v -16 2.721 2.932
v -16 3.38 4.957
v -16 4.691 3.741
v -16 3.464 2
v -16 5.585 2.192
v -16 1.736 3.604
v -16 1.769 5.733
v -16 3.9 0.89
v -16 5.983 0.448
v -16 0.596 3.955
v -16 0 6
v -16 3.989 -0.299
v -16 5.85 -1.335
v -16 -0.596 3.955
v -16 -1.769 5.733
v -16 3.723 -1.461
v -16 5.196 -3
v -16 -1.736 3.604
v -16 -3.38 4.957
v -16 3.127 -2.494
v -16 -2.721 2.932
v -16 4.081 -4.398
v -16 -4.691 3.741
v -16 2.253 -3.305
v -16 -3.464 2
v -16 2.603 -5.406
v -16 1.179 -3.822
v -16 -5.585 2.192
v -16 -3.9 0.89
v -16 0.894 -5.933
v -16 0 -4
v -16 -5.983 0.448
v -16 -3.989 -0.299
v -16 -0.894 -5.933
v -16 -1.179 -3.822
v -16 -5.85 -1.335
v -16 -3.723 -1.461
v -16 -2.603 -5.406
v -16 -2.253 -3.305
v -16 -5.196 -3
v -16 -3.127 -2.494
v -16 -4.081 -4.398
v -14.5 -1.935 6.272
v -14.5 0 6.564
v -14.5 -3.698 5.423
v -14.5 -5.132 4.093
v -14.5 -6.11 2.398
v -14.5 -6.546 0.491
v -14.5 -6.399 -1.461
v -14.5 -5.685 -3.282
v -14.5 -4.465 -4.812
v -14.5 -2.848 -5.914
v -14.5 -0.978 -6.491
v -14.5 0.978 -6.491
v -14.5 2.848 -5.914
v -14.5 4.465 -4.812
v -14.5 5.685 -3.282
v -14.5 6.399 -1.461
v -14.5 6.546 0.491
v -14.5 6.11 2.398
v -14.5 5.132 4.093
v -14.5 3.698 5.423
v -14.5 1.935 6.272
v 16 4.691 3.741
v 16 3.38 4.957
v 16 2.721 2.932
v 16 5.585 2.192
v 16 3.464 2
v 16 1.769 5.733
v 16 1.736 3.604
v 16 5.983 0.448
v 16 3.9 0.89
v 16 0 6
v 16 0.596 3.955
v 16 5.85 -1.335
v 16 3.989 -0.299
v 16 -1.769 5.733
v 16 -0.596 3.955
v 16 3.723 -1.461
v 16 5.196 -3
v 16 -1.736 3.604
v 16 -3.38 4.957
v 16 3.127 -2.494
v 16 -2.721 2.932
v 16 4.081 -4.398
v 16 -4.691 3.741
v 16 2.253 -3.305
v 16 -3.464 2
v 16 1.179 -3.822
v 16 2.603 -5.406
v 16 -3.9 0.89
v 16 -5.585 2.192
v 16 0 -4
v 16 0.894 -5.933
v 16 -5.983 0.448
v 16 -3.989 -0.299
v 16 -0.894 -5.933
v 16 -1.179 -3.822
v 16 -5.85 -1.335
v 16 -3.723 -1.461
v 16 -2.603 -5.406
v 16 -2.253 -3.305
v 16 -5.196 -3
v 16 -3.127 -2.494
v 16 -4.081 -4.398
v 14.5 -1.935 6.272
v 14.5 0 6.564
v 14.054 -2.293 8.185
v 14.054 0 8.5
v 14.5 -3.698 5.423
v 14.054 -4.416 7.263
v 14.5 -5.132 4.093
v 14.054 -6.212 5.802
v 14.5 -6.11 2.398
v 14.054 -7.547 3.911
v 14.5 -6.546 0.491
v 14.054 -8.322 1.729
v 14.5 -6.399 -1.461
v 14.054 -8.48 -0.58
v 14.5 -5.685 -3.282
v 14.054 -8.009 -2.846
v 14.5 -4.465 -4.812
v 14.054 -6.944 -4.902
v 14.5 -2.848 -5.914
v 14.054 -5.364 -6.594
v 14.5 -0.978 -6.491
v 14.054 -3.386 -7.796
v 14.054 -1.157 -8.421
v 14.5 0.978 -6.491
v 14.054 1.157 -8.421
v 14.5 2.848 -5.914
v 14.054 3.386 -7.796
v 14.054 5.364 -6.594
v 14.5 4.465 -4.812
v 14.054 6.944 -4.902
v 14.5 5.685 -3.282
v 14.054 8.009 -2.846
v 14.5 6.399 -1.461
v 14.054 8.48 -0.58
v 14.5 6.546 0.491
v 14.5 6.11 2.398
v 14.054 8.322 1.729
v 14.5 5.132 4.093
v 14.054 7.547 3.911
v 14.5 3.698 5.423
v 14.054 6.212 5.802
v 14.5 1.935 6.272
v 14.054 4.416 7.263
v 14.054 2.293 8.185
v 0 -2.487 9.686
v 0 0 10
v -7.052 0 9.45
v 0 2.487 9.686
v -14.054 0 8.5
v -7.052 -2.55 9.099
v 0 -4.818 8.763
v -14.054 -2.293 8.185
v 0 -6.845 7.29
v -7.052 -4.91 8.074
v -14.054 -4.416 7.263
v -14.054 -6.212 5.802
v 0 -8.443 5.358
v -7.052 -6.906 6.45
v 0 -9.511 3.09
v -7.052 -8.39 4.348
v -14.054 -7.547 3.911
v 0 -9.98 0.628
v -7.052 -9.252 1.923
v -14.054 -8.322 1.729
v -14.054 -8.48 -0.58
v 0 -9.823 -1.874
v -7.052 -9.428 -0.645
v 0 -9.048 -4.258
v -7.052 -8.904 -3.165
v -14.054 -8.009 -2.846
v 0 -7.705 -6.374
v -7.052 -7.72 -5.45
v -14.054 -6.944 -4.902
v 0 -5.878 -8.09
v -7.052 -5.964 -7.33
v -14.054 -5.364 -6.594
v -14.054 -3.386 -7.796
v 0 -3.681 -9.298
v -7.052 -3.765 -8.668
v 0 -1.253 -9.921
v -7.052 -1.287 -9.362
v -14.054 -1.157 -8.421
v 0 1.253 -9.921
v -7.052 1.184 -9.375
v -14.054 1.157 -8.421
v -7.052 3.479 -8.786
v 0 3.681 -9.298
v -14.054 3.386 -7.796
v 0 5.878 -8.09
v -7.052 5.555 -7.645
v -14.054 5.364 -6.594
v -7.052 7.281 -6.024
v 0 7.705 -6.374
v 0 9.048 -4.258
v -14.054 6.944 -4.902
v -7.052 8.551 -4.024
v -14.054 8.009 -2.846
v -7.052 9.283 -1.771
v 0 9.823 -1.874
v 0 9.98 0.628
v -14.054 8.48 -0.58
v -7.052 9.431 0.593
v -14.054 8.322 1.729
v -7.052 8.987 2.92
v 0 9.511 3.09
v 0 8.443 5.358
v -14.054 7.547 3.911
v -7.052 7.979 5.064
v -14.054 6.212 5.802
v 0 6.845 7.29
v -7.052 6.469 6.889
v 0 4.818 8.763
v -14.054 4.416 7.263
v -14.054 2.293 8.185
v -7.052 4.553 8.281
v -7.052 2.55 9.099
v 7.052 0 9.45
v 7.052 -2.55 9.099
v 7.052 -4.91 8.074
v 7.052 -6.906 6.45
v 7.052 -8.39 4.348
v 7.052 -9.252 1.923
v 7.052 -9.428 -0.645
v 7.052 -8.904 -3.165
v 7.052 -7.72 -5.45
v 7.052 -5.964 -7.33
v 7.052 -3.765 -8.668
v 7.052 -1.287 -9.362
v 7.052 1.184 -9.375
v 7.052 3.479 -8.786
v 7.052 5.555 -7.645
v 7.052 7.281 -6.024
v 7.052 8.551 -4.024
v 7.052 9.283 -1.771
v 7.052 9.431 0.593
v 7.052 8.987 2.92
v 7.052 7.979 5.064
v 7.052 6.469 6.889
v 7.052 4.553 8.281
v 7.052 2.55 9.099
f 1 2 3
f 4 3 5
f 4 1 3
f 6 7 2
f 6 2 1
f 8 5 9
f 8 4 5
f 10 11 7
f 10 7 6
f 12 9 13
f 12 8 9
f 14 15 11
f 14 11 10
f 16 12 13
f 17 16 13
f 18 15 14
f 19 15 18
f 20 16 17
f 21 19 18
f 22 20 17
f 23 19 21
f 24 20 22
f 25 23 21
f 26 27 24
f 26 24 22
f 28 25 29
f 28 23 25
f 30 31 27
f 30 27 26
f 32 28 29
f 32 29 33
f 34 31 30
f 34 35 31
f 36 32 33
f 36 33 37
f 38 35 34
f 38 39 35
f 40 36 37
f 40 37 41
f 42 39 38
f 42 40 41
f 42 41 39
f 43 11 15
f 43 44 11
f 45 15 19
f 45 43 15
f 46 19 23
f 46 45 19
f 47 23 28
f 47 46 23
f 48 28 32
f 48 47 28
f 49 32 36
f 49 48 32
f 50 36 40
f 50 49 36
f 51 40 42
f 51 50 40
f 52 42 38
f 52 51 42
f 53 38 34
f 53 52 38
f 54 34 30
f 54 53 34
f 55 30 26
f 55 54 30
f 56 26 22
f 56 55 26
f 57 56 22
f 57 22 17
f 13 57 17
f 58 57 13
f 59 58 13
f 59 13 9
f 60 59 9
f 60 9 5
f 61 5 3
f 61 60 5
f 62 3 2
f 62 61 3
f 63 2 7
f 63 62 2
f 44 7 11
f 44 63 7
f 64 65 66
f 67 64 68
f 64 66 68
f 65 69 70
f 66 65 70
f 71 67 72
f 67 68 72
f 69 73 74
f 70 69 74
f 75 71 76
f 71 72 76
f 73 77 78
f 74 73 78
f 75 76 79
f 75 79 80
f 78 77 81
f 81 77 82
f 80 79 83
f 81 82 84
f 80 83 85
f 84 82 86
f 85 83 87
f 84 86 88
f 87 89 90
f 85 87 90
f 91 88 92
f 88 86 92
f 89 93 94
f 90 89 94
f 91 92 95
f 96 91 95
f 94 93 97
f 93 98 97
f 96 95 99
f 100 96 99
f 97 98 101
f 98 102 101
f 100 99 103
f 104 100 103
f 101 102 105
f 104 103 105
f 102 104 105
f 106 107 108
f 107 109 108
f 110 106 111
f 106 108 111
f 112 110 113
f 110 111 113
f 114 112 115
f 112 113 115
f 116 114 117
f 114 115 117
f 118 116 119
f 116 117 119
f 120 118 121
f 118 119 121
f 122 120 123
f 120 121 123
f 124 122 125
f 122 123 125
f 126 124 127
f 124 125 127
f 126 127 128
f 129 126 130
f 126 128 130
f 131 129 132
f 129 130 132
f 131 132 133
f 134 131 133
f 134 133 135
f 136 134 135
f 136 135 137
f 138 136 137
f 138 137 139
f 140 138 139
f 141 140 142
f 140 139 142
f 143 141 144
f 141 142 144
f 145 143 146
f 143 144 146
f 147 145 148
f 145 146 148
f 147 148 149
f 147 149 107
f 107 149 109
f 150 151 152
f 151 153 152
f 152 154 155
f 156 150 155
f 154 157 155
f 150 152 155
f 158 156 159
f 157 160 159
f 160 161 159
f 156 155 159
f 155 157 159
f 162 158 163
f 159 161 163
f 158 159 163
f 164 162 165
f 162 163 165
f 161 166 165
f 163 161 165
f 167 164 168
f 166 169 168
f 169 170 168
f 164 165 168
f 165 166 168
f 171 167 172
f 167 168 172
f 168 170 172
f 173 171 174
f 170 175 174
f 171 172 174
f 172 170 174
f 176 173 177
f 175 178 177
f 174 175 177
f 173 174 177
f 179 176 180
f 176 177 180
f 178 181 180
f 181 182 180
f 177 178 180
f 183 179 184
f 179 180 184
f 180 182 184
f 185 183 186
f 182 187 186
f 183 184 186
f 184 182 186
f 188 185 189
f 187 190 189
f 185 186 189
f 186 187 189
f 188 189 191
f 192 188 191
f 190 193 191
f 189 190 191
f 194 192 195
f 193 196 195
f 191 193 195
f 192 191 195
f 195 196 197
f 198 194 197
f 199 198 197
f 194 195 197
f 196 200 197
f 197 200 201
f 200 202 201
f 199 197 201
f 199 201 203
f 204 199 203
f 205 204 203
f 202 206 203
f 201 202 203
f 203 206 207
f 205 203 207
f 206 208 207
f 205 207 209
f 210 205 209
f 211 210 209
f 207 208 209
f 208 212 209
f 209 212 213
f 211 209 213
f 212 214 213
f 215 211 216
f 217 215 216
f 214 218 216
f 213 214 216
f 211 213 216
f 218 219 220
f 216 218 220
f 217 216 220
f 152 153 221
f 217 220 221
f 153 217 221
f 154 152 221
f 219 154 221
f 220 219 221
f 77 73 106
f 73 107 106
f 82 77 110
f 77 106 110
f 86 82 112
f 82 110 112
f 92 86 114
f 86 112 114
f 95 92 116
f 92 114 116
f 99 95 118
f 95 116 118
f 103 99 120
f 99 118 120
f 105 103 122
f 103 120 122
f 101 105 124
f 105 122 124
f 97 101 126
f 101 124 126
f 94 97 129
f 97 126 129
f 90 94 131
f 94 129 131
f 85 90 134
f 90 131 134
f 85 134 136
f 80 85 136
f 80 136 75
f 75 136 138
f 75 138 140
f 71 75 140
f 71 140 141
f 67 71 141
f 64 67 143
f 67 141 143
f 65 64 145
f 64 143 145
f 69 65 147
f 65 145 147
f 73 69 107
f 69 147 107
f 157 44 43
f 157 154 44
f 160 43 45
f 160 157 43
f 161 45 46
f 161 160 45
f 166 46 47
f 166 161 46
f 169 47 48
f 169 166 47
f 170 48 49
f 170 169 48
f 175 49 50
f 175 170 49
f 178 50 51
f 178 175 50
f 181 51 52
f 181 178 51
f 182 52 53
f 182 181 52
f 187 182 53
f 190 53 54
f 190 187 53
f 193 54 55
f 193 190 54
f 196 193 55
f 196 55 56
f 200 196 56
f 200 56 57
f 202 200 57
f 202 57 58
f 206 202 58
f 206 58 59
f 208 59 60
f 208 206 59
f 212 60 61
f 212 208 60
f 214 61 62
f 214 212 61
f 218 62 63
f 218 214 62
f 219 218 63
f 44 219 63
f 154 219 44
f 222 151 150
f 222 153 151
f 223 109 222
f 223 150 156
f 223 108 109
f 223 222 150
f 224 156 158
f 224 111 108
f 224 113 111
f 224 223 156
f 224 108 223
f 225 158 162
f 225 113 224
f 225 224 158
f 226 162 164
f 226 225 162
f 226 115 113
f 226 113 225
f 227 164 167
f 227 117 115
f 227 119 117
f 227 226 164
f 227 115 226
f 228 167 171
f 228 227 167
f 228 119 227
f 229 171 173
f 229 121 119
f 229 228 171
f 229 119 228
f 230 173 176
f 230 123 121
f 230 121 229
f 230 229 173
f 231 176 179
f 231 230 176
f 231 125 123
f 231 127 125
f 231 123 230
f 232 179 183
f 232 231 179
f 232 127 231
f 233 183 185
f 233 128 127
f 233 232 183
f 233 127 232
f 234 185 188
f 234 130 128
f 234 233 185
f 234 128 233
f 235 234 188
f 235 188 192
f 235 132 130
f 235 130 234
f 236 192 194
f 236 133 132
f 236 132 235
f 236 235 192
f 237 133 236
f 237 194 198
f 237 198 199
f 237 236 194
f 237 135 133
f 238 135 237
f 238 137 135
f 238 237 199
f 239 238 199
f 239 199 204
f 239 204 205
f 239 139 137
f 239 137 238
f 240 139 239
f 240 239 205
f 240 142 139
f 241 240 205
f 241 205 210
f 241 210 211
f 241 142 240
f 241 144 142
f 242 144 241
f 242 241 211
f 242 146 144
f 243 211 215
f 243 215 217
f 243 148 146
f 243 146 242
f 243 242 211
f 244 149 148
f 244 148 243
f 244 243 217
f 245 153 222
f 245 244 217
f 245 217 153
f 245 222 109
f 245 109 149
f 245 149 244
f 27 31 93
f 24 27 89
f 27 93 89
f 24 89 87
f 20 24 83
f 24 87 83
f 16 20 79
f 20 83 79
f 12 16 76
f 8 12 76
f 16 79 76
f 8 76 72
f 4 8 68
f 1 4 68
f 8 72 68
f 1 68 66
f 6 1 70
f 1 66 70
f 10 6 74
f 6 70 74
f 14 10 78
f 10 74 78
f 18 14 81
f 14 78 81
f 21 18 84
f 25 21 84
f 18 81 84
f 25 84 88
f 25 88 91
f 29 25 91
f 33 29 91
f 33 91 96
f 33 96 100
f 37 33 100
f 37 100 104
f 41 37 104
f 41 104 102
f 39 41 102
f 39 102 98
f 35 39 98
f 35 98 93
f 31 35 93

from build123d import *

# Parameters (mm, degrees)
SKETCH7_R          = 4
CUT_EXTRUDE1_DEPTH = 35.985711426


with BuildPart() as part:
    # Sketch3 → Revolve1 (revolve)
    with BuildSketch(Plane.XY, mode=Mode.PRIVATE) as revolve1_sk:
        with BuildLine():
            Line((16, 0), (16, 6))
            Line((16, 6), (14.5, 6.563937783))
            Line((14.5, 6.563937783), (14.054189606, 8.5))
            add(Edge.make_bspline(
                [(0, 10), (7.077462611, 9.64983273), (14.054189606, 8.5)],
                knots=[0, 0, 0, 1, 1, 1], degree=2))
            Line((0, 10), (0, 0))
            Line((0, 0), (16, 0))
        make_face()
    revolve1 = revolve(revolve1_sk.sketch.rotate(Axis((0, 0, 0), (1, 0, 0)), 90), axis=Axis((0, 0, 0), (1, 0, 0)))

    # Mirror1: Revolve1 across plane
    add(revolve1.mirror(Plane(origin=(0, 10, 0), x_dir=(0, 0, 1), z_dir=(1, 0, 0))))

    # Sketch7 → Cut-Extrude1 (cut, through all)
    with BuildSketch(Plane(origin=(16, 0, 0), x_dir=(0, 0, -1), z_dir=(1, 0, 0))):
        Circle(SKETCH7_R)
    extrude(amount=-CUT_EXTRUDE1_DEPTH, mode=Mode.SUBTRACT)


solid = part.part
